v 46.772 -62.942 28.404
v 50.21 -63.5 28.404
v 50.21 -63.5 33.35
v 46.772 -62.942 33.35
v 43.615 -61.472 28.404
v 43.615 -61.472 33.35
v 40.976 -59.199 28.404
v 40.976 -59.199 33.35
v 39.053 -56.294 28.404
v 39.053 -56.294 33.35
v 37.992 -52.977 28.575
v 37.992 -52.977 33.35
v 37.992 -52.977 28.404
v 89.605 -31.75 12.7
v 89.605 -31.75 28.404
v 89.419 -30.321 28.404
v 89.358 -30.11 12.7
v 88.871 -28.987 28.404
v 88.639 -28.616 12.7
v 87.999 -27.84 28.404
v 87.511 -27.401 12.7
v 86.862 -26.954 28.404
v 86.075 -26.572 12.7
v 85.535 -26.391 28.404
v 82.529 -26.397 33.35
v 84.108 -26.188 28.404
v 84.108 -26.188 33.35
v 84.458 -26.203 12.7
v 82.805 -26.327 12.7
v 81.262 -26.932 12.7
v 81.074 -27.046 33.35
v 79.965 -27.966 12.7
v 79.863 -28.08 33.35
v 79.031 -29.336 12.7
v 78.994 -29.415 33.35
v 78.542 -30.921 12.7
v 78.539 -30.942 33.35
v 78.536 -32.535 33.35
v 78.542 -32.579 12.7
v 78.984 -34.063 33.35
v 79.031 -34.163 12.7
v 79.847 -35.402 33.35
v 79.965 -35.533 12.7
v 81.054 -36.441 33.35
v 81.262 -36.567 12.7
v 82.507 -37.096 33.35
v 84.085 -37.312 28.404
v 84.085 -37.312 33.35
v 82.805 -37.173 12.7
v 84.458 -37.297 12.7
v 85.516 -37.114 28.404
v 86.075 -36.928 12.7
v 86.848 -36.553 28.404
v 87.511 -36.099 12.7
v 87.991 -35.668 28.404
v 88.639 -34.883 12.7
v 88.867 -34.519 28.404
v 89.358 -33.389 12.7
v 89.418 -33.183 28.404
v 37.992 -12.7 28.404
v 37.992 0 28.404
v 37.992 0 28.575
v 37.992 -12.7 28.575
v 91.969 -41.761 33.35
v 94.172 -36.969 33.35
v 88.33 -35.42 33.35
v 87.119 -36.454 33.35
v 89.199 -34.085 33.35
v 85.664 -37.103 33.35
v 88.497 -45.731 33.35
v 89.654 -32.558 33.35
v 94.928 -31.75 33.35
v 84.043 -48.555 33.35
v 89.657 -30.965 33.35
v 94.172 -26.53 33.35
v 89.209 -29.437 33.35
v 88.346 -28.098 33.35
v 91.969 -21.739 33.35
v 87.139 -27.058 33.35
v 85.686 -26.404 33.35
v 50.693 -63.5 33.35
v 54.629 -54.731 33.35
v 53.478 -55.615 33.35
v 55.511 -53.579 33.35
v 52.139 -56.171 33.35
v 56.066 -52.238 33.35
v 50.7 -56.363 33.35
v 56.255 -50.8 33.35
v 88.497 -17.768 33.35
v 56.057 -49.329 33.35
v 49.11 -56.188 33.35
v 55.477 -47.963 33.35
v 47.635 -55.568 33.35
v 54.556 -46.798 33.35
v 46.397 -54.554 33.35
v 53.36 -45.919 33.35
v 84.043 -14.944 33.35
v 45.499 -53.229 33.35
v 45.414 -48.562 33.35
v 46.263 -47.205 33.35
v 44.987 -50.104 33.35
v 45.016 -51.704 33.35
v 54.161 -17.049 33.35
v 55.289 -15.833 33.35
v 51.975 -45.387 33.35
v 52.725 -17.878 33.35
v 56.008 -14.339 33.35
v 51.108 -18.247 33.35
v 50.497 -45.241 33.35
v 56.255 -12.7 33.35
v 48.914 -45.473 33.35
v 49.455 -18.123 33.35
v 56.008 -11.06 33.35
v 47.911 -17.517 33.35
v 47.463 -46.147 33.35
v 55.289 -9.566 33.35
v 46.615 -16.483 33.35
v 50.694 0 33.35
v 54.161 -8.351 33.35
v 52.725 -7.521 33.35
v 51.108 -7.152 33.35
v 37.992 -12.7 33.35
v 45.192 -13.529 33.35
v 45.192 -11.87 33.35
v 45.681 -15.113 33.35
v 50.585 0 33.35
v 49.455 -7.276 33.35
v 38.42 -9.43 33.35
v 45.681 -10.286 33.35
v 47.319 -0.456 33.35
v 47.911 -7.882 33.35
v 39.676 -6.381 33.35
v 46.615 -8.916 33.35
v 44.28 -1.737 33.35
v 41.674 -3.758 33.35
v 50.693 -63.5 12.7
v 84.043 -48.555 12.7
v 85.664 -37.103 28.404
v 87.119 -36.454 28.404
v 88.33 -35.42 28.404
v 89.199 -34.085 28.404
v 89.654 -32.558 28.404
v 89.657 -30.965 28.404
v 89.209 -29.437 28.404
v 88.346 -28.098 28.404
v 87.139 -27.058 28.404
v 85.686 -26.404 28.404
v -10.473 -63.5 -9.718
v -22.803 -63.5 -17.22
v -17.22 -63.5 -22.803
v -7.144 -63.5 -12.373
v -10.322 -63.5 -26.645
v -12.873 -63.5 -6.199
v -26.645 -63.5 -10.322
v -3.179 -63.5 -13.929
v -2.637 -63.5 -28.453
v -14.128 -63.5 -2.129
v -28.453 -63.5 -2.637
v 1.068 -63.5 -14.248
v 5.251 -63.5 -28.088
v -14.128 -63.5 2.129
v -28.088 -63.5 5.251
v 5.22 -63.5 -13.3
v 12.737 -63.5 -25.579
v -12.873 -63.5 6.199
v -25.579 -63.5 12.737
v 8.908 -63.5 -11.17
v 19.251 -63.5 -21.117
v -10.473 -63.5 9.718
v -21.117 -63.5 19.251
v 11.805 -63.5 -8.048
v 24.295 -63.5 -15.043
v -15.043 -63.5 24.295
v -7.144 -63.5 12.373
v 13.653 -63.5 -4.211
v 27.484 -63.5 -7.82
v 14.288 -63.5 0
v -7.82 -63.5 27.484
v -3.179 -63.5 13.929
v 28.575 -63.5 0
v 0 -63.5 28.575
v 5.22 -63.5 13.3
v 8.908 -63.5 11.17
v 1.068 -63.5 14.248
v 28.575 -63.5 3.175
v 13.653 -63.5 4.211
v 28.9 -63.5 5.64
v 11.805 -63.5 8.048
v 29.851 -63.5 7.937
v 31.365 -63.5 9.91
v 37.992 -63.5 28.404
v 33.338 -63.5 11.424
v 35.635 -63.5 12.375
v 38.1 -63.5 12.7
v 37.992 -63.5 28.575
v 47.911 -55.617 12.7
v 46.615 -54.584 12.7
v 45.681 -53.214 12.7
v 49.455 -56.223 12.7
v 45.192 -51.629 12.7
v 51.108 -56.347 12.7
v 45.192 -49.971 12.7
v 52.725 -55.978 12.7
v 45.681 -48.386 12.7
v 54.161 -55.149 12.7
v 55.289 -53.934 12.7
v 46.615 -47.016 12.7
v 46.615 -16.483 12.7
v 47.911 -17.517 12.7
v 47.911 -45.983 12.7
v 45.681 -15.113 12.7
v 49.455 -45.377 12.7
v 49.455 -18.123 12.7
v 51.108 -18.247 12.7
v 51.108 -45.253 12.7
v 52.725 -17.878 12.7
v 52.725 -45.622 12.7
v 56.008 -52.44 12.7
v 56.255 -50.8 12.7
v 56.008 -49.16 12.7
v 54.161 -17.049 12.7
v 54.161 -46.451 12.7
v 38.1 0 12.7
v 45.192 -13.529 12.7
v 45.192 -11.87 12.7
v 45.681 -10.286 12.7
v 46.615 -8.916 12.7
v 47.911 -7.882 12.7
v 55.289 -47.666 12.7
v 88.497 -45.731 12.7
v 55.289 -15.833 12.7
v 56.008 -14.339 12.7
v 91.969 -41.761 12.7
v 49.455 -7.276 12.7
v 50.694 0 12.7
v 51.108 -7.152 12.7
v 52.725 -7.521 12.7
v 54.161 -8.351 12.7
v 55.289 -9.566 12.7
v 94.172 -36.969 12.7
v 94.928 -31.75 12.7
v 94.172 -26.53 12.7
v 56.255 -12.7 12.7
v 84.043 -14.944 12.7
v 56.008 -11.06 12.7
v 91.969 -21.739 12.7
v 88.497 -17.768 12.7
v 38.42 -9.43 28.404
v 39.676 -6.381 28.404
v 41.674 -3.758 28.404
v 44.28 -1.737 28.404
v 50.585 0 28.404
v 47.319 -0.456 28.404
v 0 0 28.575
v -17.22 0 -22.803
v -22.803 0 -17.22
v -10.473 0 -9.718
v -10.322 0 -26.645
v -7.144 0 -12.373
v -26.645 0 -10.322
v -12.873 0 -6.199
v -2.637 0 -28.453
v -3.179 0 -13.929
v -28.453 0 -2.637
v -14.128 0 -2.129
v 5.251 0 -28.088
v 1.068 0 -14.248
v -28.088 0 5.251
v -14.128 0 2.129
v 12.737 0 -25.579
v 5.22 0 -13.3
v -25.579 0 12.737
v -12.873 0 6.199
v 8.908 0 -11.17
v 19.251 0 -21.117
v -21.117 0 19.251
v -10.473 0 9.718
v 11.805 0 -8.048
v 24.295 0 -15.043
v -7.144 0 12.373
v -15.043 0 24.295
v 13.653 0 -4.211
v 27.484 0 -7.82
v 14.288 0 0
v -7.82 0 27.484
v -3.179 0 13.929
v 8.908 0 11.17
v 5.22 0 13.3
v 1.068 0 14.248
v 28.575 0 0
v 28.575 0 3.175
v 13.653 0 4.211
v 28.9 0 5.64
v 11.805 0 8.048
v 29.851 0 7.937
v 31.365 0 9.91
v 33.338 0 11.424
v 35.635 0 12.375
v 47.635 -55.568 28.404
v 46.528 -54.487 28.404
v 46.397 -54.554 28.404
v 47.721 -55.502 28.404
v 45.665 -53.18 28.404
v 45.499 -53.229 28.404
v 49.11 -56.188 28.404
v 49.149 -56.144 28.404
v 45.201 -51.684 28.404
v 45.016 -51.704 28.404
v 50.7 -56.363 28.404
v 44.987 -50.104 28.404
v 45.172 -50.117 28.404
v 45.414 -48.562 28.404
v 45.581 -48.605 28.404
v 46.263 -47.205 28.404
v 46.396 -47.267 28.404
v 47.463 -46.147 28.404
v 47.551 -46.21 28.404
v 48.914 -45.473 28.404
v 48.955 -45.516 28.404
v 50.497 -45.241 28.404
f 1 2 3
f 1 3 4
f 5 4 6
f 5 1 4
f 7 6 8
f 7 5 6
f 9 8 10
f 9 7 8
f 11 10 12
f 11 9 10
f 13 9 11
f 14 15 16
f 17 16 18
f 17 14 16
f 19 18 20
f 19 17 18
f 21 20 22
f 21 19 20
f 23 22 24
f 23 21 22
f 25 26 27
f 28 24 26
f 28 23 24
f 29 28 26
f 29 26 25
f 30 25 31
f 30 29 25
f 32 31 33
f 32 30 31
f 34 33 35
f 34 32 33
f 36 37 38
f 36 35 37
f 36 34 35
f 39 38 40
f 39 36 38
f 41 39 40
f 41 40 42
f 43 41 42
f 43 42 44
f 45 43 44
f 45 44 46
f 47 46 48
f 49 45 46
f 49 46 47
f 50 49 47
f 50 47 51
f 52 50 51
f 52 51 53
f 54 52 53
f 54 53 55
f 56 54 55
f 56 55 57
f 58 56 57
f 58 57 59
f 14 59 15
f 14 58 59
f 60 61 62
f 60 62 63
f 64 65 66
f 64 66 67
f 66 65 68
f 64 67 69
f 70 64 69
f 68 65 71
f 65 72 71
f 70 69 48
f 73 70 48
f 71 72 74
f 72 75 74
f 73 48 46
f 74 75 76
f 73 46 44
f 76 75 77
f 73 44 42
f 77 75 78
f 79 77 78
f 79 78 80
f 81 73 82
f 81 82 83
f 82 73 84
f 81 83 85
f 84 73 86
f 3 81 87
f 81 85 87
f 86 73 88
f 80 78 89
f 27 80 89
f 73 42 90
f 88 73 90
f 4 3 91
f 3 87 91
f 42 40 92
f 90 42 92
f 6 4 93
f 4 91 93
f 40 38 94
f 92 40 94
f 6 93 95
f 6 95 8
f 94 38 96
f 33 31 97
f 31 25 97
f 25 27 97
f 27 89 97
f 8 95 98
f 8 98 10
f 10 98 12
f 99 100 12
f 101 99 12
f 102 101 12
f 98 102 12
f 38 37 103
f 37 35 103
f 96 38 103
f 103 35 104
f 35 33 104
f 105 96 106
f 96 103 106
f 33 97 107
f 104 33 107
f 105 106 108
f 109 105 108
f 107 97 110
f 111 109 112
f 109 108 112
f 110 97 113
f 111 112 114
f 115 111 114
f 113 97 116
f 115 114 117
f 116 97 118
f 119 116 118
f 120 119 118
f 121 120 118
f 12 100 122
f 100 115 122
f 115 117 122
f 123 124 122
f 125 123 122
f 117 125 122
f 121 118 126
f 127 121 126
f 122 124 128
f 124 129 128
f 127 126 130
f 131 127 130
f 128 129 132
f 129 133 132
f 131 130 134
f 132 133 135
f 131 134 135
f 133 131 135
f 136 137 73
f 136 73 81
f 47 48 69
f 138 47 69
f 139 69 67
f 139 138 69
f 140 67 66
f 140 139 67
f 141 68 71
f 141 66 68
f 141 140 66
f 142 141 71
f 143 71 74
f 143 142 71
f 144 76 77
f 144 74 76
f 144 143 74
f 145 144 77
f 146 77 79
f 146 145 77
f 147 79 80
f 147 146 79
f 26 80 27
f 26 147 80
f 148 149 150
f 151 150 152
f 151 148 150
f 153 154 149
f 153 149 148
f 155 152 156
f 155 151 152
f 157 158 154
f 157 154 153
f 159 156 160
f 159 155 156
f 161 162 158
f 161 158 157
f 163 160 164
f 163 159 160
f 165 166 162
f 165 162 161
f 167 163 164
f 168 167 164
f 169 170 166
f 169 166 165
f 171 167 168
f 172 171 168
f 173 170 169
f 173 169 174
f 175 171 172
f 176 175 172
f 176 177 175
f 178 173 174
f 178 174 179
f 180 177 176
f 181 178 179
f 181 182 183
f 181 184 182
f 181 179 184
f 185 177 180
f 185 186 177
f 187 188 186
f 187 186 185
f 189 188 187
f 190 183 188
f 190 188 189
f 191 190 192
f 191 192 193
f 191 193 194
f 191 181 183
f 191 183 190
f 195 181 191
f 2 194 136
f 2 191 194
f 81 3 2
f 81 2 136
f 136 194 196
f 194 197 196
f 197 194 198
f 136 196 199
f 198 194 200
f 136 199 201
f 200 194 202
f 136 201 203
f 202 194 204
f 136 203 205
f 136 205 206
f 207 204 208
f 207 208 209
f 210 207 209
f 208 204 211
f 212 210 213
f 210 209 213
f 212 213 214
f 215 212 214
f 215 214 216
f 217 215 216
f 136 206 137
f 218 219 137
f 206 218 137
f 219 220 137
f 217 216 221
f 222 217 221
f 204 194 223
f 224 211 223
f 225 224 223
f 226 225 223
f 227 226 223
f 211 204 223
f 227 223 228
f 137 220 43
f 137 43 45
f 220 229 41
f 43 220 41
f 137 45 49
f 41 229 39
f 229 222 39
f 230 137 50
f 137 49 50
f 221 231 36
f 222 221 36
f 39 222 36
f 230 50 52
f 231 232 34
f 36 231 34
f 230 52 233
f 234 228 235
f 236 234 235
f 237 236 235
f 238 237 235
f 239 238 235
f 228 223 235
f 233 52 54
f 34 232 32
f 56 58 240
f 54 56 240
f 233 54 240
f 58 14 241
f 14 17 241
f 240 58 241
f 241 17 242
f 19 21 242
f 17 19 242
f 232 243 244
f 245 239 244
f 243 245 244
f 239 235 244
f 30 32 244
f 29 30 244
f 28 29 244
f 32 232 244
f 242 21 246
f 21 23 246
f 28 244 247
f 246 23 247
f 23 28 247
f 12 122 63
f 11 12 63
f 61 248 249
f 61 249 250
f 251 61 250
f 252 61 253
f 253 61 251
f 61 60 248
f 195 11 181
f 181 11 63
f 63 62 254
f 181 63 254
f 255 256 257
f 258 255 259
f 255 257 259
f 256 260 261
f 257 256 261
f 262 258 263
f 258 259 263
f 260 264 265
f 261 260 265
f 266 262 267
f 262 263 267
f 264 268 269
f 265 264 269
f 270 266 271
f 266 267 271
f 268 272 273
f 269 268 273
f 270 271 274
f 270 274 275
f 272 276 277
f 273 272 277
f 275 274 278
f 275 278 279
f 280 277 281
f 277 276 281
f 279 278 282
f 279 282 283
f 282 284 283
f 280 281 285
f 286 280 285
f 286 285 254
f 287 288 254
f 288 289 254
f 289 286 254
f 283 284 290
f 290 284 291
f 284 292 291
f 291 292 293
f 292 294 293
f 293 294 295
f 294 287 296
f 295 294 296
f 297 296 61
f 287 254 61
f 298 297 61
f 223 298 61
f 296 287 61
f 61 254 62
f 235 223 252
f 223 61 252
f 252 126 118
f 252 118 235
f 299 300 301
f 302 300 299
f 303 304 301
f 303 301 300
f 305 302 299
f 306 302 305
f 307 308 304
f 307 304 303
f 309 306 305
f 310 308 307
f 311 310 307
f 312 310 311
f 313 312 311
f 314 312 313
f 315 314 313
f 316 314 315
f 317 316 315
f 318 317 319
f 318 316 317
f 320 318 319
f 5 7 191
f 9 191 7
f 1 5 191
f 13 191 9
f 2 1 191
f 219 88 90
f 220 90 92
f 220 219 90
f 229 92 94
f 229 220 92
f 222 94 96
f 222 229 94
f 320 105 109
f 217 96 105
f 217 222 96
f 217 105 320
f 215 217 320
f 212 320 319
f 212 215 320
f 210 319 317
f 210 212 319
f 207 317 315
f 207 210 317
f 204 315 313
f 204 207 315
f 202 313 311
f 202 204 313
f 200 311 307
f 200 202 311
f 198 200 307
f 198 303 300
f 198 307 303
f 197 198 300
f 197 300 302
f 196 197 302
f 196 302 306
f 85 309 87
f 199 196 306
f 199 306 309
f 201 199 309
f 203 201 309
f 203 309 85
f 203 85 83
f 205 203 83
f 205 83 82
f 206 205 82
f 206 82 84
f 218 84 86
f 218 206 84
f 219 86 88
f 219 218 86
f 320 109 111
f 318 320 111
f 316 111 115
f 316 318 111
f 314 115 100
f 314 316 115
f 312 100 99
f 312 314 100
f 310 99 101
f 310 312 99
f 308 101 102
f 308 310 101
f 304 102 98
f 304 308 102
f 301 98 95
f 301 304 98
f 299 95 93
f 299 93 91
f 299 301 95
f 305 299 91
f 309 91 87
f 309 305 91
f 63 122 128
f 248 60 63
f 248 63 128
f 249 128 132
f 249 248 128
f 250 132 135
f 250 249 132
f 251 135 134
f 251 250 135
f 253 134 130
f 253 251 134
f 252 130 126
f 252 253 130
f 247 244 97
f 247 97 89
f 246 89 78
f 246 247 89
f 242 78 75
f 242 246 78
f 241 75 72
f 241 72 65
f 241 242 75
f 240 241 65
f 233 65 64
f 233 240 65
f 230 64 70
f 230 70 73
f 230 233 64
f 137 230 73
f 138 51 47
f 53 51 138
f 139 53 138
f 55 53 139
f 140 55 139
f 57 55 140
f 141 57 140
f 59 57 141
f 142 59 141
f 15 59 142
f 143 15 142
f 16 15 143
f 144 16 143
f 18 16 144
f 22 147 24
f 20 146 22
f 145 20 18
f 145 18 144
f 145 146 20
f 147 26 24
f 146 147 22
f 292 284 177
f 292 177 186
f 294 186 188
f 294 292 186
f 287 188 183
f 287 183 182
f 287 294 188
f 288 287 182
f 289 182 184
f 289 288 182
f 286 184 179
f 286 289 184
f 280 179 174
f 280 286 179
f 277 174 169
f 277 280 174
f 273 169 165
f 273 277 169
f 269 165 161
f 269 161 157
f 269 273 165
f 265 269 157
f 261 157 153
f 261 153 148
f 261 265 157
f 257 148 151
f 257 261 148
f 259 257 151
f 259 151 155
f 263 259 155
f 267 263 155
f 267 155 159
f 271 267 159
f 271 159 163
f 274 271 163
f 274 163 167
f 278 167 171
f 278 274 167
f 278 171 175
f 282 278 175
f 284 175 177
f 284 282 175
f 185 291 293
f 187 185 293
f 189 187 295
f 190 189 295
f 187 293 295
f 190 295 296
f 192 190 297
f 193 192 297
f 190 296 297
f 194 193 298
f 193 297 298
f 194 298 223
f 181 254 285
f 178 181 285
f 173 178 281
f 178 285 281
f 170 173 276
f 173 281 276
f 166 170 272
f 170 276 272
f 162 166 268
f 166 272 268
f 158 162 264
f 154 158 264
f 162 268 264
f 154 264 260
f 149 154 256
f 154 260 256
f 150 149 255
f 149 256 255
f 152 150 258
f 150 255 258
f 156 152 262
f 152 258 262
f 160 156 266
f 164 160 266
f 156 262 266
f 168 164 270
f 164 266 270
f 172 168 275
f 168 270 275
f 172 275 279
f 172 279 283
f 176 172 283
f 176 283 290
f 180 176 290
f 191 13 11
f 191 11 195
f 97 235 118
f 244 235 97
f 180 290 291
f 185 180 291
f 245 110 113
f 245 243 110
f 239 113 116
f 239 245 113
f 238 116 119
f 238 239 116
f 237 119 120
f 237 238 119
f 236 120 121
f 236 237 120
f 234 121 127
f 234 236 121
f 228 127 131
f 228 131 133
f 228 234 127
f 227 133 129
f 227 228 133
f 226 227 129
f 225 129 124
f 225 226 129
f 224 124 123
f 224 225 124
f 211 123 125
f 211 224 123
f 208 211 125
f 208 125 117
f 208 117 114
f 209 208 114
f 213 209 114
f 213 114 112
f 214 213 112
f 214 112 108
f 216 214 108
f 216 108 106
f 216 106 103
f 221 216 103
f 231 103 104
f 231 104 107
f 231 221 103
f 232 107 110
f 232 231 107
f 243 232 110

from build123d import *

# Parameters (mm, degrees)
F0_R     = 14.2875
F1_DEPTH = 63.5
F3_START = 28.40385
F2_R     = 5.5626
F3_DEPTH = 4.94635
F4_R     = 5.5626
F5_DEPTH = 33.3512


with BuildPart() as f1:
    # F0 (on Front) → F1 (new body)
    with BuildSketch(Plane.XZ):
        with BuildLine():
            Line((37.9924699664, 28.575), (0, 28.575))
            ThreePointArc((0, 28.575), (-20.2055762724, -20.2055762724), (28.575, 0))
            Line((28.575, 0), (28.575, 3.175))
            ThreePointArc((28.575, 3.175), (31.3648079092, 9.9101920908), (38.1, 12.7))
            Line((38.1, 12.7), (69.85, 12.7))
            Line((69.85, 12.7), (95.0348461551, 12.7))
            Line((95.0348461551, 12.7), (95.0348461551, 33.3502))
            Line((95.0348461551, 33.3502), (37.9924699664, 33.3502))
            Line((37.9924699664, 33.3502), (37.9924699664, 28.575))
        make_face()
        Circle(F0_R, mode=Mode.SUBTRACT)
    extrude(amount=F1_DEPTH)

    # F2 (on Top) → F3 (cut)
    with BuildSketch(Plane.XY.offset(F3_START)):
        with BuildLine():
            ThreePointArc((37.9924699664, -12.7), (41.6741160957, -3.757548703), (50.5849399165, 0))
            Line((50.5849399165, 0), (37.9924699664, 0))
            Line((37.9924699664, 0), (37.9924699664, -12.7))
        make_face()
        with BuildLine():
            Line((50.5849399165, 0), (50.8, 0))
            ThreePointArc((50.8, 0), (50.6924699583, 0.000455233), (50.5849399165, 0))
        make_face()
        with BuildLine():
            Line((37.9924699664, -63.5), (50.2103307418, -63.5))
            ThreePointArc((50.2103307418, -63.5), (42.2169815898, -60.4261048405), (37.9924699664, -52.9765435338))
            Line((37.9924699664, -52.9765435338), (37.9924699664, -63.5))
        make_face()
        with BuildLine():
            ThreePointArc((50.2103307418, -63.5), (50.5051653709, -63.5034228021), (50.8, -63.5))
            Line((50.8, -63.5), (50.2103307418, -63.5))
        make_face()
        with Locations((84.1502, -31.75)):
            Circle(F2_R)
        with Locations((50.6924699583, -12.699544767)):
            Circle(F2_R)
        with Locations((50.5051653709, -50.8034228021)):
            Circle(F2_R)
    extrude(amount=F3_DEPTH, mode=Mode.SUBTRACT)

    # F4 (on Top) → F5 (cut, through all)
    with BuildSketch(Plane.XY):
        with BuildLine():
            Line((84.0428003407, -48.5551651302), (50.6926003407, -63.5))
            Line((50.6926003407, -63.5), (95.0348461551, -63.5))
            Line((95.0348461551, -63.5), (95.0348461551, 0))
            Line((95.0348461551, 0), (50.6926003407, 0.0004552323))
            Line((50.6926003407, 0.0004552323), (84.0428003407, -14.9443796375))
            ThreePointArc((84.0428003407, -14.9443796375), (94.9275939219, -31.7497723839), (84.0428003407, -48.5551651302))
        make_face()
        with Locations((84.0428003407, -31.7497723839)):
            Circle(F4_R)
        with Locations((50.6924699583, -12.699544767)):
            Circle(F4_R)
        with Locations((50.6926003407, -50.8)):
            Circle(F4_R)
    extrude(amount=F5_DEPTH, mode=Mode.SUBTRACT)


solid = f1.part
